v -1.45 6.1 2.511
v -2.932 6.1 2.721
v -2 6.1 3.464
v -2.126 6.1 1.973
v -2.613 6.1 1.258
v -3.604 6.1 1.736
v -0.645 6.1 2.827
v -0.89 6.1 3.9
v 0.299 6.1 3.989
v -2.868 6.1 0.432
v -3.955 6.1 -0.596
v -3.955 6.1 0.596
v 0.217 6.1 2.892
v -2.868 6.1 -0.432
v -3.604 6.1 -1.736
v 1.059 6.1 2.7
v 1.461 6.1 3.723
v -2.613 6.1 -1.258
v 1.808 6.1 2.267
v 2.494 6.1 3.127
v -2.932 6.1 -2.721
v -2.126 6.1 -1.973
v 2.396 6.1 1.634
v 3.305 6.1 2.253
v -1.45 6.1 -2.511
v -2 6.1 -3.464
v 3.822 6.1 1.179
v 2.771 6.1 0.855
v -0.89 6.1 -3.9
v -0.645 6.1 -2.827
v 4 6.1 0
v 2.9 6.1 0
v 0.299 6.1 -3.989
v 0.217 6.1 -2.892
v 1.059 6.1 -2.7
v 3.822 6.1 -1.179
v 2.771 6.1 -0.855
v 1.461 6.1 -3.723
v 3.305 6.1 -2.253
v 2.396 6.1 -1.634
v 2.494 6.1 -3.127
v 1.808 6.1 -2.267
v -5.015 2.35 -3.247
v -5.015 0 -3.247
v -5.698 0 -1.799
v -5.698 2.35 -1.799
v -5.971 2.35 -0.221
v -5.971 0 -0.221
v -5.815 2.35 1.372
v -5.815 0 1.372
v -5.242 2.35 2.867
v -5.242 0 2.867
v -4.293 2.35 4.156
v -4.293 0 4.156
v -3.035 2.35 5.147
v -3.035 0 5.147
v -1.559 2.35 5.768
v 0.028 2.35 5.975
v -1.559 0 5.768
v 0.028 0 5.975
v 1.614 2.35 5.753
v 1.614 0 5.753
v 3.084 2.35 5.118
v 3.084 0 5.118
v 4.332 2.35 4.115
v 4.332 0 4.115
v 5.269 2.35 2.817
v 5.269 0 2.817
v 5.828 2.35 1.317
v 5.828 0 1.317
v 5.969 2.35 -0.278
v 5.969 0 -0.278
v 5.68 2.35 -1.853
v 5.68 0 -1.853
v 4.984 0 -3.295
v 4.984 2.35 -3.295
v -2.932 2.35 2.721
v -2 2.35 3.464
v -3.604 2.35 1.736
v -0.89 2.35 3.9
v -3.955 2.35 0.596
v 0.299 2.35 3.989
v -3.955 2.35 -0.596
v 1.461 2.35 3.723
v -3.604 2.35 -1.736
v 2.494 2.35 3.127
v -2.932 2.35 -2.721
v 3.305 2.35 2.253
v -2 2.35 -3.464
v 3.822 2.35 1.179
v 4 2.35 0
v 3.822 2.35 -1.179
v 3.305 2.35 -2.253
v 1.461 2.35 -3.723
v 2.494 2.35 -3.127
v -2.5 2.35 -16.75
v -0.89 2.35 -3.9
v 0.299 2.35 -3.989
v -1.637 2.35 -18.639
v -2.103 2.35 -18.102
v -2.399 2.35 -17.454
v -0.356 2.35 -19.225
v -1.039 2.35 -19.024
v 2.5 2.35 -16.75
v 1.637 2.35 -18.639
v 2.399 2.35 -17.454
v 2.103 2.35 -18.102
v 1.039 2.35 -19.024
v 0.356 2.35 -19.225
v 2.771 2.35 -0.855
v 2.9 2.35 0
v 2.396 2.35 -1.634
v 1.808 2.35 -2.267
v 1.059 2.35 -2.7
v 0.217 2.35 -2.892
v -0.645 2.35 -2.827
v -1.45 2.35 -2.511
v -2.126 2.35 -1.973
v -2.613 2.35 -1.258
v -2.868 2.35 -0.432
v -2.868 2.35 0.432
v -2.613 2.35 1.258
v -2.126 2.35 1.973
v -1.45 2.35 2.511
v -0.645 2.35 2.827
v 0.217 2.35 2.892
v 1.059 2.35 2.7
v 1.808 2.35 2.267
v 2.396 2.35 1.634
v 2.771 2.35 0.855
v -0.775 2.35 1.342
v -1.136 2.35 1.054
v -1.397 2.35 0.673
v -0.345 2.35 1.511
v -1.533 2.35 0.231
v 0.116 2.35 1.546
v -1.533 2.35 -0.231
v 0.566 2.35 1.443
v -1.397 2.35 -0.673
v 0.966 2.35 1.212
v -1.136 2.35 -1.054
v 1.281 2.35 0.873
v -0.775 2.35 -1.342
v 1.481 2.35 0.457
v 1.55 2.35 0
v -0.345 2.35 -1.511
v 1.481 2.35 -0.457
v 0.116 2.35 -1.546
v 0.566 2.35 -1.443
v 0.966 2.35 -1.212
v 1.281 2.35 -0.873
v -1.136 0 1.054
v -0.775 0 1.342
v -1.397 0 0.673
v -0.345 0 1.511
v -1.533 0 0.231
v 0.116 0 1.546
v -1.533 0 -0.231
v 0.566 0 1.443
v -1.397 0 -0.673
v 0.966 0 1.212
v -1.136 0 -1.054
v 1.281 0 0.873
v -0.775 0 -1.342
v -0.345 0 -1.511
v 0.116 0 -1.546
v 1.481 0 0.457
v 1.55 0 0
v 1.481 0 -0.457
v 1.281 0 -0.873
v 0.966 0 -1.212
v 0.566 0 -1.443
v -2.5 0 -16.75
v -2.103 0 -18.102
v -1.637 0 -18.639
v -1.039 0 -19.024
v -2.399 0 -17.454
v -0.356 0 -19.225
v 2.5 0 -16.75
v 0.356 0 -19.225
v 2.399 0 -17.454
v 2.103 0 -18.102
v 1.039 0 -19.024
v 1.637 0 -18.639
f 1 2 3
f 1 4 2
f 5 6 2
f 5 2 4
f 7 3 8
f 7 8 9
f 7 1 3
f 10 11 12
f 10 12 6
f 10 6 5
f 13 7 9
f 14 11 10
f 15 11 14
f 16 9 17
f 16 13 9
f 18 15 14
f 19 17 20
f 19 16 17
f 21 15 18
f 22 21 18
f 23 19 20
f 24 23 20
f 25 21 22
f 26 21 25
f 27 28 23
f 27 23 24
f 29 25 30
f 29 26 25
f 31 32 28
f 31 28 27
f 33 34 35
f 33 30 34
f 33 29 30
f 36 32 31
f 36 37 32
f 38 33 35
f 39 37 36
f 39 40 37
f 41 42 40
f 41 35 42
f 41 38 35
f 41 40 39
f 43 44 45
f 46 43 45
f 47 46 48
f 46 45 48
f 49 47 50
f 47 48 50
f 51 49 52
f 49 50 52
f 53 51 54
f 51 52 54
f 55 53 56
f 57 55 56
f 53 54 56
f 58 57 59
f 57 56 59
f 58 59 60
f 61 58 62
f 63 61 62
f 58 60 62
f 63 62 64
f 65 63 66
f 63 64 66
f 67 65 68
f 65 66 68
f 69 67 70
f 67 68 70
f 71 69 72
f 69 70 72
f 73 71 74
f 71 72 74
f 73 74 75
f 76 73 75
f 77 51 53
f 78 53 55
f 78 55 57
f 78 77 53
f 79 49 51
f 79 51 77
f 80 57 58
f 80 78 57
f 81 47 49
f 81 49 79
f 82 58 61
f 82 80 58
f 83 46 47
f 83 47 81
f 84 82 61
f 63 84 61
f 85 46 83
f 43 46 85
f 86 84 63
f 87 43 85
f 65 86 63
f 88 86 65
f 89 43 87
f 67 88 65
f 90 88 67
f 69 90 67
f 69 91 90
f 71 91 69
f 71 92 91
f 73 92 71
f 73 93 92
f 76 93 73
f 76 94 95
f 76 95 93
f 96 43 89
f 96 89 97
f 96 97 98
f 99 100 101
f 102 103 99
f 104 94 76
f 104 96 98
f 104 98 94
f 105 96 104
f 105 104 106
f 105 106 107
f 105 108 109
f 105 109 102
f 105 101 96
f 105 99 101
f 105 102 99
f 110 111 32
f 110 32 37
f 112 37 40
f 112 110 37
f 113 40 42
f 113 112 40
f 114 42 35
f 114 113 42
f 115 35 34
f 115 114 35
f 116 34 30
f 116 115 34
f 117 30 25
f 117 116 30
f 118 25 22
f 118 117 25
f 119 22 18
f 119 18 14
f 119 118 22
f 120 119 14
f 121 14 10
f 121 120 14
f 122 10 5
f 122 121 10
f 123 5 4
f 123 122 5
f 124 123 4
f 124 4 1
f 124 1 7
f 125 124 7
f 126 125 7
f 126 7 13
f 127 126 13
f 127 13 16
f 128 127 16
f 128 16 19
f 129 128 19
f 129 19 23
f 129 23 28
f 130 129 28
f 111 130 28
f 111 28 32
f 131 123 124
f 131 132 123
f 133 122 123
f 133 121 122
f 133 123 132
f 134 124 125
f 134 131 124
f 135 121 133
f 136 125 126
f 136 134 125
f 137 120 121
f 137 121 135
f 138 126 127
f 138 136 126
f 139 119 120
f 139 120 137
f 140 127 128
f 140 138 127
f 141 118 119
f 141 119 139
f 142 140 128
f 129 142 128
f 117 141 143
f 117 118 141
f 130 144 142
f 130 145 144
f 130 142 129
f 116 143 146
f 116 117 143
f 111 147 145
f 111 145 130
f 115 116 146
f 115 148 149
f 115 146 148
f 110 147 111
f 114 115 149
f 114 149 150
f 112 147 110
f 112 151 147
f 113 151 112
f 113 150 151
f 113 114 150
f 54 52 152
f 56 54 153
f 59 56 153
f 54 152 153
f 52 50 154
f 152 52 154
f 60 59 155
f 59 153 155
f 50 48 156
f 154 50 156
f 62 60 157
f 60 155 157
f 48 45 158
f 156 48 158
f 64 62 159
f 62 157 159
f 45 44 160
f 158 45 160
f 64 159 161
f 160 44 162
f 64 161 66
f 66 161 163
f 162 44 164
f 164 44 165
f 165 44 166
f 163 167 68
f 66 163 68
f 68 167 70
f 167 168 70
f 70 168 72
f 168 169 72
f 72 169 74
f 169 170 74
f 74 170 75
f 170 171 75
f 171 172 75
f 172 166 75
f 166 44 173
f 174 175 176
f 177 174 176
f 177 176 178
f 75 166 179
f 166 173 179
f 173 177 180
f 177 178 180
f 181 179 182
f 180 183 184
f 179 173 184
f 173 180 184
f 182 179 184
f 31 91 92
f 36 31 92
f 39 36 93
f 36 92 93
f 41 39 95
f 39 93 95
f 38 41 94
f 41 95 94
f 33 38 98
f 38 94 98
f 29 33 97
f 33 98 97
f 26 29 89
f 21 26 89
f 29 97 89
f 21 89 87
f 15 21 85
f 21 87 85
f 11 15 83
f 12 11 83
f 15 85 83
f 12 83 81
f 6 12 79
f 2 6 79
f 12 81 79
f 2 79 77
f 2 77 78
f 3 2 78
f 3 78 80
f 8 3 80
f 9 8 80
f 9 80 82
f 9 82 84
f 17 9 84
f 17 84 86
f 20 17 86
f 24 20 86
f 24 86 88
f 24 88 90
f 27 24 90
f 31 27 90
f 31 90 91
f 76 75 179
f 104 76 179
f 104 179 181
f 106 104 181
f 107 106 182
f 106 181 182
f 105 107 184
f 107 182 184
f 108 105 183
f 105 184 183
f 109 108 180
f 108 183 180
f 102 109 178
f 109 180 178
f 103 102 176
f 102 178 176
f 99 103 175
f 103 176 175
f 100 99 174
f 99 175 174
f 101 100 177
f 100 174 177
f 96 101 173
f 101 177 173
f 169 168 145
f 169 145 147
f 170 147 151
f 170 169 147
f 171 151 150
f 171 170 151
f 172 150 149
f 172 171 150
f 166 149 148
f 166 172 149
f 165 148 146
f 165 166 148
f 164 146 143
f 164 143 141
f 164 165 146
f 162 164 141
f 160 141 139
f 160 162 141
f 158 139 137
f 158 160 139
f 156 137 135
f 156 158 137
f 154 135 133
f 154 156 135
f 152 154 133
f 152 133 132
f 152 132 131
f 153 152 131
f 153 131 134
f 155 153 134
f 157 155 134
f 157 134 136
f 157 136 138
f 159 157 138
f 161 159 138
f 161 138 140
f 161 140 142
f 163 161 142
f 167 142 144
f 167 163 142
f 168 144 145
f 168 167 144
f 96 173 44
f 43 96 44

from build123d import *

# Parameters (mm, degrees)
SKETCH1_R           = 1.55
BOSS_EXTRUDE1_DEPTH = 2.35
SKETCH1_3_R         = 4
SKETCH1_3_R_2       = 2.9
BOSS_EXTRUDE2_DEPTH = 6.1


with BuildPart() as part:
    # Sketch1 → Boss-Extrude1 (new body)
    with BuildSketch(Plane(origin=(0, 0, 0), x_dir=(1, 0, 0), z_dir=(0, 1, 0))):
        with BuildLine():
            Line((-2.5, 16.75), (-5.015451004, 3.247441489))
            ThreePointArc((-5.015451004, 3.247441489), (0.028324767, -5.974932862), (4.984436631, 3.294846957))
            Line((4.984436631, 3.294846957), (2.5, 16.75))
            ThreePointArc((2.5, 16.75), (0, 19.25), (-2.5, 16.75))
        make_face()
        Circle(SKETCH1_R, mode=Mode.SUBTRACT)
    extrude(amount=BOSS_EXTRUDE1_DEPTH)

    # Sketch1<3> → Boss-Extrude2 (add)
    with BuildSketch(Plane(origin=(0, 0, 0), x_dir=(1, 0, 0), z_dir=(0, 1, 0))):
        Circle(SKETCH1_3_R)
        Circle(SKETCH1_3_R_2, mode=Mode.SUBTRACT)
    extrude(amount=BOSS_EXTRUDE2_DEPTH)


solid = part.part
